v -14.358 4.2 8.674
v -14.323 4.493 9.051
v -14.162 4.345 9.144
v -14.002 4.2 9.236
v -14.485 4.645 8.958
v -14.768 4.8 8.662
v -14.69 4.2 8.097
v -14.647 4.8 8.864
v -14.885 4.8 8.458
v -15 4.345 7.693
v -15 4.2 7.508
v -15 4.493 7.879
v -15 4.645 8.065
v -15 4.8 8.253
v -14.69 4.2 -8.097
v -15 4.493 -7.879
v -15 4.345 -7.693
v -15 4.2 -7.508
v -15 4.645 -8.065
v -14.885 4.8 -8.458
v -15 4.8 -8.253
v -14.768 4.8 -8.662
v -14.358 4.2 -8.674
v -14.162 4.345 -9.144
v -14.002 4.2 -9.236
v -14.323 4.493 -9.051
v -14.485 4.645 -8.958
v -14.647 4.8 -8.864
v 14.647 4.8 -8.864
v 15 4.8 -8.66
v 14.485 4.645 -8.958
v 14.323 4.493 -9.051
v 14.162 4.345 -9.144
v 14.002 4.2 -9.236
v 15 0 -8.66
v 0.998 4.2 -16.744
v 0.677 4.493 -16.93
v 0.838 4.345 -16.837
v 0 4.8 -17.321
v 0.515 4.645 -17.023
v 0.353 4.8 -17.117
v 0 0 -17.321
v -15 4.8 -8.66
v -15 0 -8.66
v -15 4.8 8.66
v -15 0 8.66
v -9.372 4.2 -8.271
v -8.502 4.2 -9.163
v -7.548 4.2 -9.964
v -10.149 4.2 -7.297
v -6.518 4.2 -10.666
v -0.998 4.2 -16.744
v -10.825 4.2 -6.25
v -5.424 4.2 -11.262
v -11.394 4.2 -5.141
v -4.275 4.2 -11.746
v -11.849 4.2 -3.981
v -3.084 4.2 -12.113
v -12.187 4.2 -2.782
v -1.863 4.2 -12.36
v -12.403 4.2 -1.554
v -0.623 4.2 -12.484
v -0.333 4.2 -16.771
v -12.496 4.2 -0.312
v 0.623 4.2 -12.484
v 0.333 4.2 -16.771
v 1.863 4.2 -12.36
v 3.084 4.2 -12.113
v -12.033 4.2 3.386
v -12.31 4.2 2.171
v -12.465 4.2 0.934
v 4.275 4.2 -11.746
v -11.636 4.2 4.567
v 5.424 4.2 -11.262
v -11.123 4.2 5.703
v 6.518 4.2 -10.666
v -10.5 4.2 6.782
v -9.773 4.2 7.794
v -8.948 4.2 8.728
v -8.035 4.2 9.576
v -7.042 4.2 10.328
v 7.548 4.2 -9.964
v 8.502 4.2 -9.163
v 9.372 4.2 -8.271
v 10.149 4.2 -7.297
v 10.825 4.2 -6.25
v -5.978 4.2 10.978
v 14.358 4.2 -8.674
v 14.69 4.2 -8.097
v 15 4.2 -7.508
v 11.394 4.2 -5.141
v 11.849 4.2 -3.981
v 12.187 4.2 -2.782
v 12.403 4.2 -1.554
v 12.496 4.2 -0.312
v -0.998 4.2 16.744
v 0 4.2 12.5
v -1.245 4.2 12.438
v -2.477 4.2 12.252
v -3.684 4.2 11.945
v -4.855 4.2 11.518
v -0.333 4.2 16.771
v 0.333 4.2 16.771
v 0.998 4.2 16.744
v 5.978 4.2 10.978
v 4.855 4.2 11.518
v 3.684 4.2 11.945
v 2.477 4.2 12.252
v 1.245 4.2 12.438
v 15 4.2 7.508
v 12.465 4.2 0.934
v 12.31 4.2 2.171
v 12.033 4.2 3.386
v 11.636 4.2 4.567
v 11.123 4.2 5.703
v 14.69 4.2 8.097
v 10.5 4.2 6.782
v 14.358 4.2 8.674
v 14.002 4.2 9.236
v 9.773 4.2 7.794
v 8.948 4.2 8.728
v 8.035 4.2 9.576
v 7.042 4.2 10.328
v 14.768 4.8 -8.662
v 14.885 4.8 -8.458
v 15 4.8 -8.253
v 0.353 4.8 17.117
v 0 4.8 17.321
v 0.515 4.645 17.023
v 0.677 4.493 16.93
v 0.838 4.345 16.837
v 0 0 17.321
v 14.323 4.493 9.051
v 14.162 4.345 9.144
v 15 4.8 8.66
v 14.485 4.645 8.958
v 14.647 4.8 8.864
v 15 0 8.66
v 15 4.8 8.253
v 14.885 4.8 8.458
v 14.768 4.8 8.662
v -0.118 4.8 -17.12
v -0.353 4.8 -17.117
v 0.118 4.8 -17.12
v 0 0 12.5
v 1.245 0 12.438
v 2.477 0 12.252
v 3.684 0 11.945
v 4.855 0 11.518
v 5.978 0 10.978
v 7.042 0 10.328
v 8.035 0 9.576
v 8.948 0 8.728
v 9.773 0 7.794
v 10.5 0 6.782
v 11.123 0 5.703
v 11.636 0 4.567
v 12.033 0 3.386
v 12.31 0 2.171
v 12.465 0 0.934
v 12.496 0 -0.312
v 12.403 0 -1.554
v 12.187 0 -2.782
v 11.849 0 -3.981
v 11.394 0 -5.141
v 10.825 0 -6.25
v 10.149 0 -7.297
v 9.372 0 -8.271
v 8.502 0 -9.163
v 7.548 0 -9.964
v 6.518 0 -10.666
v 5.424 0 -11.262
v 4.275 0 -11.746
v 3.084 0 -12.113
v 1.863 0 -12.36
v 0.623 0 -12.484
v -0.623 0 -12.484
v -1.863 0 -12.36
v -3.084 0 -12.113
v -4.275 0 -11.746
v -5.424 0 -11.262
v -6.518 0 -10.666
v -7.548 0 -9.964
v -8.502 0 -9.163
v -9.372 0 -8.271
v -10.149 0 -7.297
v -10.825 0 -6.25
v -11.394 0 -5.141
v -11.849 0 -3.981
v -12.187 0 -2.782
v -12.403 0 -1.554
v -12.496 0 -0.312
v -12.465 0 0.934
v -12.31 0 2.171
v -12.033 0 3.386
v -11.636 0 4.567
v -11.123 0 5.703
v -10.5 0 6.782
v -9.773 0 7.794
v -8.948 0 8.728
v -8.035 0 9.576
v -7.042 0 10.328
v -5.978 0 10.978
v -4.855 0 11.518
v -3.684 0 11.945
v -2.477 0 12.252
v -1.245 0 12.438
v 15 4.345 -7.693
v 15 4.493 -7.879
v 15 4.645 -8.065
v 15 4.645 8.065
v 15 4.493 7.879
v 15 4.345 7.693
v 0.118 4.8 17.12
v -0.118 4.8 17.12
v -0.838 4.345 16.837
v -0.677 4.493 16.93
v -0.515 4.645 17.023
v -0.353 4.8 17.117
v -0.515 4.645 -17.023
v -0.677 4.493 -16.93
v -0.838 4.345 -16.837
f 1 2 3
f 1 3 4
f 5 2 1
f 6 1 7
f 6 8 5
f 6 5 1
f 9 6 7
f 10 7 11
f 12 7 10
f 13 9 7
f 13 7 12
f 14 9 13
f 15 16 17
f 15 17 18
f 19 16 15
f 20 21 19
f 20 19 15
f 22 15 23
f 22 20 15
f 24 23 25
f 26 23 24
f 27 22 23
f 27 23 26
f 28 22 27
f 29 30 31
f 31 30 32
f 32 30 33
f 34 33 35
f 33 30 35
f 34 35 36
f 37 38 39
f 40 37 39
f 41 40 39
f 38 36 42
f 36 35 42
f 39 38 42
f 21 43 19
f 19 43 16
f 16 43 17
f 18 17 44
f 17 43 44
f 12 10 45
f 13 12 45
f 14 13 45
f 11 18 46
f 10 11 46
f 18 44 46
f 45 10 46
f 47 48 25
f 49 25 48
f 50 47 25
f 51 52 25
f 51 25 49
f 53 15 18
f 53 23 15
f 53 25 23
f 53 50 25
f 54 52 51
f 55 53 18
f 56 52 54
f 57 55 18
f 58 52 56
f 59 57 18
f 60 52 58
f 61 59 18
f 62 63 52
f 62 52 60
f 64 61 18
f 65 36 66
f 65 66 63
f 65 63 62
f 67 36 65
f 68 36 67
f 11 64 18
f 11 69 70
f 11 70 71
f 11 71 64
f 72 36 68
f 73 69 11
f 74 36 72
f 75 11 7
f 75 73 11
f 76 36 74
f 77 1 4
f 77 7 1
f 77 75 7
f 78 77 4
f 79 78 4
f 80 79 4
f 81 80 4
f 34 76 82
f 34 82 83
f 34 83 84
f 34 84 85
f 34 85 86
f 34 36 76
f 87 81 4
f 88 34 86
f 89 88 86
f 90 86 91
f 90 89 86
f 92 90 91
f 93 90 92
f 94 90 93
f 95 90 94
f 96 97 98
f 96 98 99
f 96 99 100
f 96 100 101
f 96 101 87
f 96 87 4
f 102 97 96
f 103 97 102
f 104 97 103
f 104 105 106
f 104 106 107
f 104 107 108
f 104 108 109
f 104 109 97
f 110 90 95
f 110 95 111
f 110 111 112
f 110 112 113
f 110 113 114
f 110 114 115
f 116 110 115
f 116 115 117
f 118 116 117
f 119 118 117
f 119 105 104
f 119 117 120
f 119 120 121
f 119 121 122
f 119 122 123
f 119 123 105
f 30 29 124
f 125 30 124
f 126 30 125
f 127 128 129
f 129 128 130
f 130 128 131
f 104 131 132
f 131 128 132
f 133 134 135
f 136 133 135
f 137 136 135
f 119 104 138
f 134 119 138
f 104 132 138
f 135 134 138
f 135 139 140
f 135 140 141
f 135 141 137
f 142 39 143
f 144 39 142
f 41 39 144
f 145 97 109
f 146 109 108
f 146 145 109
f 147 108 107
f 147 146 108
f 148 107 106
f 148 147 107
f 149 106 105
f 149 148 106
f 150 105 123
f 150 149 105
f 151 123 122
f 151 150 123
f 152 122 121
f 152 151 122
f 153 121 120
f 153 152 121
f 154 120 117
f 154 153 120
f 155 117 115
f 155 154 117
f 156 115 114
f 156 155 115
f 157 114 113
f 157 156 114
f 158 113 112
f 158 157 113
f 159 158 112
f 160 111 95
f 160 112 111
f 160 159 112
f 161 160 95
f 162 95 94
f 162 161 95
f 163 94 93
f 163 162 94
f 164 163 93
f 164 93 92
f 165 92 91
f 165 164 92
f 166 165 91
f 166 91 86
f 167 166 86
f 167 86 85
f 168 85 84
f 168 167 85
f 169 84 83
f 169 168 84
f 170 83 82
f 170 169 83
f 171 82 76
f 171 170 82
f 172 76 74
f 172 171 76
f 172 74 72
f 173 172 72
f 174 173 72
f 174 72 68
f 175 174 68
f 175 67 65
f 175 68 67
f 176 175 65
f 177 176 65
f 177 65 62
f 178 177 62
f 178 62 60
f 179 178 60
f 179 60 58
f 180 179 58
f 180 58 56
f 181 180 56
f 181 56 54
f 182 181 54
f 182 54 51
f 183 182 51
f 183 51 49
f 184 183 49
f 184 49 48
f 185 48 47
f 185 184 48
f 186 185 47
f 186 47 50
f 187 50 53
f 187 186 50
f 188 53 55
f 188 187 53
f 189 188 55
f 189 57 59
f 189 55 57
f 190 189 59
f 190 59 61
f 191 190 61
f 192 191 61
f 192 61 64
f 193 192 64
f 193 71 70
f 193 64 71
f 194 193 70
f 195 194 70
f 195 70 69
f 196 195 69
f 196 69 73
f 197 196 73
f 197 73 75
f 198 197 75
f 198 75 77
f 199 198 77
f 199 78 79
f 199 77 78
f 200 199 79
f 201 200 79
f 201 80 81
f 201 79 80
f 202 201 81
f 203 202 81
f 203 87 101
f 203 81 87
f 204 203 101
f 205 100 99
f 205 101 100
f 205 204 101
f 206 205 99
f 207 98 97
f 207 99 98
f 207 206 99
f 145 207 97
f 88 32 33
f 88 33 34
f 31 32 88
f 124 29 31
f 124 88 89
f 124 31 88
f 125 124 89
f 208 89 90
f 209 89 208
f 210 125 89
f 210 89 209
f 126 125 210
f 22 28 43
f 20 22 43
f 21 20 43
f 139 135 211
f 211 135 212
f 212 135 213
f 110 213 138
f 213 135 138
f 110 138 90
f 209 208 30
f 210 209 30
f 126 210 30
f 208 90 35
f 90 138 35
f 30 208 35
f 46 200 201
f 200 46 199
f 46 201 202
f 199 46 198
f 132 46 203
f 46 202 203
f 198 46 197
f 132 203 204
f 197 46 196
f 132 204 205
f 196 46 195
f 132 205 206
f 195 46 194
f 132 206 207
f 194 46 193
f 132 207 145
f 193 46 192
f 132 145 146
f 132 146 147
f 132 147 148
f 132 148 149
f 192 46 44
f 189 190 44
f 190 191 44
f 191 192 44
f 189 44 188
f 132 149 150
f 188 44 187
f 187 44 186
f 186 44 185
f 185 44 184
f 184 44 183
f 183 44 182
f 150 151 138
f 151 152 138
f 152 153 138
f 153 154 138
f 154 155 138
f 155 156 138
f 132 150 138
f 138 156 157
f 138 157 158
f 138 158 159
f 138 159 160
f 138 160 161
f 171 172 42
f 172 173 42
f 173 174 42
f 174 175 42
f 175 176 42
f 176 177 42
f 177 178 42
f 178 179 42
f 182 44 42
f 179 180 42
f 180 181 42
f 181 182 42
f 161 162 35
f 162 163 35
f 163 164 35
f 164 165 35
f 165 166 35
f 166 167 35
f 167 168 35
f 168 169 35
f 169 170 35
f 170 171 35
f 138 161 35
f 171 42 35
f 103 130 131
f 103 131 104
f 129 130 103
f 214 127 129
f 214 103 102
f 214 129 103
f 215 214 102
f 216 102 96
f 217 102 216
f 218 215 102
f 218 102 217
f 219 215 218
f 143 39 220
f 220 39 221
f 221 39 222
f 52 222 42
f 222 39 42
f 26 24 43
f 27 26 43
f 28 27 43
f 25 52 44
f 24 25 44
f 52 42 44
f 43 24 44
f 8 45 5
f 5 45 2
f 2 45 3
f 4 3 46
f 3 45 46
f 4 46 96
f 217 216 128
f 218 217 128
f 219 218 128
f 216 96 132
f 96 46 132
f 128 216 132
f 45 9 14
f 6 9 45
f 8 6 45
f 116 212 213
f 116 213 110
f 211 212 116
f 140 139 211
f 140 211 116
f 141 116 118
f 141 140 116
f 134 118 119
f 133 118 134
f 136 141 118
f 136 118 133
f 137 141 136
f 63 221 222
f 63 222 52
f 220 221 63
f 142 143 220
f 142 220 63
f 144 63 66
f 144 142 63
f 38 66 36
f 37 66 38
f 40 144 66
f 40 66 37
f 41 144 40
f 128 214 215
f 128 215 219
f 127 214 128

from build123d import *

# Parameters (mm, degrees)
SKETCH1_R      = 12.5
EXTRUDE1_DEPTH = 7


with BuildPart() as part:
    # Sketch1 → Extrude1 (new body)
    with BuildSketch(Plane(origin=(0, 0, 0), x_dir=(1, 0, 0), z_dir=(0, 1, 0))):
        Polygon((0, 17.320508076), (-15, 8.660254038), (-15, -8.660254038), (0, -17.320508076), (15, -8.660254038), (15, 8.660254038), align=None)
        with Locations(Location((0, 0, 0), (0, 0, 270))):
            Circle(SKETCH1_R, mode=Mode.SUBTRACT)
    extrude(amount=EXTRUDE1_DEPTH)

    # Sketch2 → Cut-Revolve1 (revolve, cut)
    with BuildSketch(Plane(origin=(0, 0, 0), x_dir=(0, 0, -1), z_dir=(1, 0, 0)), mode=Mode.PRIVATE) as cut_revolve1_sk:
        Polygon((0, 4.2), (-16.774097914, 4.2), (-17.120508076, 4.8), (-17.320508076, 4.8), (-17.320508076, 15.108314228), (0, 15.108314228), align=None)
    revolve(cut_revolve1_sk.sketch.rotate(Axis((0, 15.108314228, 0), (0, -1, 0)), 180), axis=Axis((0, 15.108314228, 0), (0, -1, 0)), mode=Mode.SUBTRACT)


solid = part.part
